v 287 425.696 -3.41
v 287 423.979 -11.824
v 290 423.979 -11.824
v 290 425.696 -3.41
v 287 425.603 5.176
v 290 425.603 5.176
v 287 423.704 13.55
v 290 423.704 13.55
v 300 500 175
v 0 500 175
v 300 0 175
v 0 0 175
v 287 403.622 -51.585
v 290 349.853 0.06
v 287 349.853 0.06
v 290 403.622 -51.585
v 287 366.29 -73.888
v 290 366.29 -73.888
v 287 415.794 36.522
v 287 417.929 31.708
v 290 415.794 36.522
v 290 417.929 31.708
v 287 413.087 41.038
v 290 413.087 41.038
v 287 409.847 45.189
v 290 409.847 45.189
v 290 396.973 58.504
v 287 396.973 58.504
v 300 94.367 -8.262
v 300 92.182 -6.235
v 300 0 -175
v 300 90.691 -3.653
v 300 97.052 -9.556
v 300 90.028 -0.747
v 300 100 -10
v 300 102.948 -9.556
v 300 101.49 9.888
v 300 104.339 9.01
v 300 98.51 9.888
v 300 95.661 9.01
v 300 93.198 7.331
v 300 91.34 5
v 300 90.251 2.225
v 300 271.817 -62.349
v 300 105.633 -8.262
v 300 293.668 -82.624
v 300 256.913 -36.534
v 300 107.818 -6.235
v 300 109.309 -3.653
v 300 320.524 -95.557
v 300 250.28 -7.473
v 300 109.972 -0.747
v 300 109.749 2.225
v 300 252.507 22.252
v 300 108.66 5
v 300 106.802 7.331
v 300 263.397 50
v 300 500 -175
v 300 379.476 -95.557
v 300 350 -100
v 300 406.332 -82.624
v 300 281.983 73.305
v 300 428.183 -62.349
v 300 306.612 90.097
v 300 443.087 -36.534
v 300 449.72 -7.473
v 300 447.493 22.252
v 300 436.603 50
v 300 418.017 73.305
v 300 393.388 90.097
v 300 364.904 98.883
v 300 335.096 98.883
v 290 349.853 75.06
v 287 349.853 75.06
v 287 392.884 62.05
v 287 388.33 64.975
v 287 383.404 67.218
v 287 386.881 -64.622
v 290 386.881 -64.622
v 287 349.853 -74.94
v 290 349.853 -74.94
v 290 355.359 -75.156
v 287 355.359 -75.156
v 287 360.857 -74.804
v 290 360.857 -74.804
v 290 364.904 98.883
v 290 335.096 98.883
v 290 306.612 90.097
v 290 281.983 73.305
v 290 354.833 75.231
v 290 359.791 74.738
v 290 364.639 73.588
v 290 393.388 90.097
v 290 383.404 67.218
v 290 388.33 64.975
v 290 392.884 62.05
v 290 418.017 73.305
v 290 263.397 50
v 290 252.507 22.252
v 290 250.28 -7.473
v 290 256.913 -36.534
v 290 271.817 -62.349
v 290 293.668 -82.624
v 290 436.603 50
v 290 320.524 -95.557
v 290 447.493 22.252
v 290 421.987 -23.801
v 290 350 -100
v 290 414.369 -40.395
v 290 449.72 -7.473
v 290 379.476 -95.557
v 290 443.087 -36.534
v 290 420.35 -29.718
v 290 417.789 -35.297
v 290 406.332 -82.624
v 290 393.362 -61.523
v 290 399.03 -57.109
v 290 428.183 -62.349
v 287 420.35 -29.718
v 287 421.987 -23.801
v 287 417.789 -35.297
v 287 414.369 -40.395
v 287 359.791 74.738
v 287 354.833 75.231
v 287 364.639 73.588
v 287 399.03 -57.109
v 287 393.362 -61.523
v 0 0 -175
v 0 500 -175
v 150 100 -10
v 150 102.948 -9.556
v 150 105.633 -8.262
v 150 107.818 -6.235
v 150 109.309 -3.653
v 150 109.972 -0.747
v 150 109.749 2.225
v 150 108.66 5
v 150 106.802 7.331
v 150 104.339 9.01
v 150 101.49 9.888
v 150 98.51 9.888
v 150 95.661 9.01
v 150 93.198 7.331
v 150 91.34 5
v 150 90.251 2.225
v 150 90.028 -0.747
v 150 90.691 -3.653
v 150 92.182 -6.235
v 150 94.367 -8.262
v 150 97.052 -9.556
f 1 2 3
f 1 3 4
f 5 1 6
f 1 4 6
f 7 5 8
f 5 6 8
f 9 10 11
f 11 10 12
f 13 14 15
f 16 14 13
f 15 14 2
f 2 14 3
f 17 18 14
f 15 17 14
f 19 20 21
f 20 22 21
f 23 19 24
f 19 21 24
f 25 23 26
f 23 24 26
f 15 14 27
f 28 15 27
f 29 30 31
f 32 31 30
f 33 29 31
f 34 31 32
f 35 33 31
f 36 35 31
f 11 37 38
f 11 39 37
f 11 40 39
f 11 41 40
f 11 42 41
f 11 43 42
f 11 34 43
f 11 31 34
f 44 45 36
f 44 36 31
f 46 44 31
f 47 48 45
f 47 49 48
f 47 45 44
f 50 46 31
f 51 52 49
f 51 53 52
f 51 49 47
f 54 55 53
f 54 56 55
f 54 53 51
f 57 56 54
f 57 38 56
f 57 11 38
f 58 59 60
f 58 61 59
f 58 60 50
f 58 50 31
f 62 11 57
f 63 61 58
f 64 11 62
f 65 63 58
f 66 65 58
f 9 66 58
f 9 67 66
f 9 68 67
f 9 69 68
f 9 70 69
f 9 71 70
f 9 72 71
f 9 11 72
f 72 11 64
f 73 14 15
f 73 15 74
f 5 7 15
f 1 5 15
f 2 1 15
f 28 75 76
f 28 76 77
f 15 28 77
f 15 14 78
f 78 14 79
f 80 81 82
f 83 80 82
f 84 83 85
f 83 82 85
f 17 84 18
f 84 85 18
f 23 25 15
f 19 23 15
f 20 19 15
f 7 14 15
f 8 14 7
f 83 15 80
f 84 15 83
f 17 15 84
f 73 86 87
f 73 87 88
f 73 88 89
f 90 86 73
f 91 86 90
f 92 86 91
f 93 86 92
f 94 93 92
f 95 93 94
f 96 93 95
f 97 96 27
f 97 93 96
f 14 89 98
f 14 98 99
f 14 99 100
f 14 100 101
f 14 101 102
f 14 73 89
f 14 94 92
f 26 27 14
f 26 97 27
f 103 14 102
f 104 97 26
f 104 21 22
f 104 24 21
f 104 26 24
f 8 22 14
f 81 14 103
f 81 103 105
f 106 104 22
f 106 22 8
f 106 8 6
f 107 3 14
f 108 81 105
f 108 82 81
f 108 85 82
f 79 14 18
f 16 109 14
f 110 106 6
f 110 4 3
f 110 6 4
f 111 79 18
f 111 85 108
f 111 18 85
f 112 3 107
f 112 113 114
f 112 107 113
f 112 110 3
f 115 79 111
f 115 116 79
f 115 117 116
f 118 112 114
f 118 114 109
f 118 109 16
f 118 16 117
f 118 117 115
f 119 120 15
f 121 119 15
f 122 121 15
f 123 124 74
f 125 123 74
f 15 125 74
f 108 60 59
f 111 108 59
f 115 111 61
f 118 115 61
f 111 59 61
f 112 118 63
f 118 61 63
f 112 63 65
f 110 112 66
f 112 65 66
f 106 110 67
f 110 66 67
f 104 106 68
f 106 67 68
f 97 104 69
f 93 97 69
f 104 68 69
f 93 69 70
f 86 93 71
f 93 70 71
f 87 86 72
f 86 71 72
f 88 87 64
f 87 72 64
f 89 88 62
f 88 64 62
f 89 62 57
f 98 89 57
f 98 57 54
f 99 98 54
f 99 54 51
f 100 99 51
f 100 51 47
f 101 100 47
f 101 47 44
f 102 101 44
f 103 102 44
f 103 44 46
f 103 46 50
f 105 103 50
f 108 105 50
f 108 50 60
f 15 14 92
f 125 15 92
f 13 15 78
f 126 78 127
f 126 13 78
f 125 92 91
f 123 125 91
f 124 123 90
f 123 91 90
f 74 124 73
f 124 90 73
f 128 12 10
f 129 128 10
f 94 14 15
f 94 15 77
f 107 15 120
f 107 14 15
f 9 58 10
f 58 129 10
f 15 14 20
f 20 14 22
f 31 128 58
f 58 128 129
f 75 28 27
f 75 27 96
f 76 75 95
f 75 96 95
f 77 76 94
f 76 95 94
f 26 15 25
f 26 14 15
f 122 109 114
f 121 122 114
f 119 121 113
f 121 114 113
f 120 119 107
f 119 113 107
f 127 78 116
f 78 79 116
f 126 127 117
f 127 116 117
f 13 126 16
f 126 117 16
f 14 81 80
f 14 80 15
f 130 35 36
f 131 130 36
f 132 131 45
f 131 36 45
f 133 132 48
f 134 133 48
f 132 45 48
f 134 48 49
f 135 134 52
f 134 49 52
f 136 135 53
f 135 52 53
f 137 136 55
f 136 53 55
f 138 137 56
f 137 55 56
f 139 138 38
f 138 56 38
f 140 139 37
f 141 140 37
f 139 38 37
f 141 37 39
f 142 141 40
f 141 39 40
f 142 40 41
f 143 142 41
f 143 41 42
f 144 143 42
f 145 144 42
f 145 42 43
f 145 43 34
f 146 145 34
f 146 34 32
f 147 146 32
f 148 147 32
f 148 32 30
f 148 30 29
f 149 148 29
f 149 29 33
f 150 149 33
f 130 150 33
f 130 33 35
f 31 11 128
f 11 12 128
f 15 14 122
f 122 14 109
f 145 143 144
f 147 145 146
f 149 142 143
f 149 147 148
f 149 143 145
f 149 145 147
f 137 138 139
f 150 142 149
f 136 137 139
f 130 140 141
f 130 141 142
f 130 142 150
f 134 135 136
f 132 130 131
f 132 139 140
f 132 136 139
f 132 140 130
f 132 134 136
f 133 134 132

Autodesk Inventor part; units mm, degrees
ref_plane "YZ Plane" through (0, 0, 0) normal (1, 0, 0) x (0, 1, 0)
ref_plane "XZ Plane" through (0, 0, 0) normal (0, 1, 0) x (-1, 0, 0)
ref_plane "XY Plane" through (0, 0, 0) normal (0, 0, 1) x (1, 0, 0)
sketch "Sketch1" plane through (0, 0, 0) normal (1, 0, 0) x (0, 1, 0)
  point P0 (0, 0)
sketch "Sketch2" plane through (0, 0, 0) normal (1, 0, 0) x (0, 1, 0)
  line L0 (500, 175) -> (0, 175)
  line L1 (0, 175) -> (0, -175)
  line L2 (0, -175) -> (500, -175)
  line L3 (500, -175) -> (500, 175)
  point P0 (0, 0)
  dimension "d0" = 500
  dimension "d1" = 350
  dimension "d2" = 175
  dimension "d3" = 500
extrude "Extrusion1" add sketch "Sketch2" along normal blind 300
sketch "Sketch3" plane through (300, 0, 0) normal (1, 0, 0) x (0, 0, -1)
  circle A0 centre (0, 350) radius 100
  point P0 (0, 0)
  dimension "d6" = 200
  dimension "d7" = 350
extrude "Extrusion2" cut sketch "Sketch3" against normal blind 10
sketch "Sketch6" plane through (290, 350, 0) normal (1, 0, 0) x (0, 0, -1)
  line L0 (-0.0604, -0.1466) -> (-75.0604, -0.1466)
  line L1 (-75.0604, -0.1466) -> (-0.0604, -0.1466)
  line L2 (-0.0604, -0.1466) -> (-73.5885, 14.6388)
  line L3 (-0.0604, -0.1466) -> (-67.2185, 33.4039)
  line L4 (-0.0604, -0.1466) -> (-58.5037, 46.9726)
  line L5 (-0.0604, -0.1466) -> (-45.1893, 59.847)
  line L6 (-0.0604, -0.1466) -> (-31.7085, 67.9287)
  line L7 (-0.0604, -0.1466) -> (-13.5499, 73.7038)
  line L8 (-0.0604, -0.1466) -> (11.8236, 73.9791)
  arc A0 (-73.5885, 14.6388) -> (-75.0604, -0.1466) centre (-37.9126, 3.6215) ccw
  arc A1 (-58.5037, 46.9726) -> (-67.2185, 33.4039) centre (-31.8389, 20.2637) ccw
  arc A2 (-31.7085, 67.9287) -> (-45.1893, 59.847) centre (-16.7307, 27.6606) ccw
  arc A3 (11.8236, 73.9791) -> (-13.5499, 73.7038) centre (-0.4454, 35.3353) ccw
  line L9 (-0.0604, -0.1466) -> (64.6218, 36.8812)
  line L10 (-0.0604, -0.1466) -> (51.5848, 53.6216)
  line L11 (-0.0604, -0.1466) -> (40.3954, 64.3692)
  line L12 (-0.0604, -0.1466) -> (23.8014, 71.9871)
  arc A4 (40.3954, 64.3692) -> (23.8014, 71.9871) centre (16.5753, 34.3639) ccw
  arc A5 (64.6218, 36.8812) -> (51.5848, 53.6216) centre (33.1363, 25.8077) ccw
  arc A6 (74.9396, -0.1466) -> (73.8878, 16.2903) centre (21.7524, 4.7019) ccw
  line L13 (73.8878, 16.2903) -> (-0.0604, -0.1466)
  line L14 (74.9396, -0.1466) -> (-0.0604, -0.1466)
  point P0 (0, -350)
  dimension "d18" = 75
  dimension "d20" = 11.37
  dimension "d21" = 75
extrude "Extrusion3" cut sketch "Sketch6" against normal blind 3
sketch "Sketch7" plane through (300, 0, 0) normal (1, 0, 0) x (0, 0, -1)
  circle A0 centre (0, 100) radius 10
  point P0 (0, 0)
  dimension "d24" = 100
  dimension "d25" = 20
extrude "Extrusion4" cut sketch "Sketch7" against normal blind 150
equation "\"d21\" = d18"
properties part number "holder"
